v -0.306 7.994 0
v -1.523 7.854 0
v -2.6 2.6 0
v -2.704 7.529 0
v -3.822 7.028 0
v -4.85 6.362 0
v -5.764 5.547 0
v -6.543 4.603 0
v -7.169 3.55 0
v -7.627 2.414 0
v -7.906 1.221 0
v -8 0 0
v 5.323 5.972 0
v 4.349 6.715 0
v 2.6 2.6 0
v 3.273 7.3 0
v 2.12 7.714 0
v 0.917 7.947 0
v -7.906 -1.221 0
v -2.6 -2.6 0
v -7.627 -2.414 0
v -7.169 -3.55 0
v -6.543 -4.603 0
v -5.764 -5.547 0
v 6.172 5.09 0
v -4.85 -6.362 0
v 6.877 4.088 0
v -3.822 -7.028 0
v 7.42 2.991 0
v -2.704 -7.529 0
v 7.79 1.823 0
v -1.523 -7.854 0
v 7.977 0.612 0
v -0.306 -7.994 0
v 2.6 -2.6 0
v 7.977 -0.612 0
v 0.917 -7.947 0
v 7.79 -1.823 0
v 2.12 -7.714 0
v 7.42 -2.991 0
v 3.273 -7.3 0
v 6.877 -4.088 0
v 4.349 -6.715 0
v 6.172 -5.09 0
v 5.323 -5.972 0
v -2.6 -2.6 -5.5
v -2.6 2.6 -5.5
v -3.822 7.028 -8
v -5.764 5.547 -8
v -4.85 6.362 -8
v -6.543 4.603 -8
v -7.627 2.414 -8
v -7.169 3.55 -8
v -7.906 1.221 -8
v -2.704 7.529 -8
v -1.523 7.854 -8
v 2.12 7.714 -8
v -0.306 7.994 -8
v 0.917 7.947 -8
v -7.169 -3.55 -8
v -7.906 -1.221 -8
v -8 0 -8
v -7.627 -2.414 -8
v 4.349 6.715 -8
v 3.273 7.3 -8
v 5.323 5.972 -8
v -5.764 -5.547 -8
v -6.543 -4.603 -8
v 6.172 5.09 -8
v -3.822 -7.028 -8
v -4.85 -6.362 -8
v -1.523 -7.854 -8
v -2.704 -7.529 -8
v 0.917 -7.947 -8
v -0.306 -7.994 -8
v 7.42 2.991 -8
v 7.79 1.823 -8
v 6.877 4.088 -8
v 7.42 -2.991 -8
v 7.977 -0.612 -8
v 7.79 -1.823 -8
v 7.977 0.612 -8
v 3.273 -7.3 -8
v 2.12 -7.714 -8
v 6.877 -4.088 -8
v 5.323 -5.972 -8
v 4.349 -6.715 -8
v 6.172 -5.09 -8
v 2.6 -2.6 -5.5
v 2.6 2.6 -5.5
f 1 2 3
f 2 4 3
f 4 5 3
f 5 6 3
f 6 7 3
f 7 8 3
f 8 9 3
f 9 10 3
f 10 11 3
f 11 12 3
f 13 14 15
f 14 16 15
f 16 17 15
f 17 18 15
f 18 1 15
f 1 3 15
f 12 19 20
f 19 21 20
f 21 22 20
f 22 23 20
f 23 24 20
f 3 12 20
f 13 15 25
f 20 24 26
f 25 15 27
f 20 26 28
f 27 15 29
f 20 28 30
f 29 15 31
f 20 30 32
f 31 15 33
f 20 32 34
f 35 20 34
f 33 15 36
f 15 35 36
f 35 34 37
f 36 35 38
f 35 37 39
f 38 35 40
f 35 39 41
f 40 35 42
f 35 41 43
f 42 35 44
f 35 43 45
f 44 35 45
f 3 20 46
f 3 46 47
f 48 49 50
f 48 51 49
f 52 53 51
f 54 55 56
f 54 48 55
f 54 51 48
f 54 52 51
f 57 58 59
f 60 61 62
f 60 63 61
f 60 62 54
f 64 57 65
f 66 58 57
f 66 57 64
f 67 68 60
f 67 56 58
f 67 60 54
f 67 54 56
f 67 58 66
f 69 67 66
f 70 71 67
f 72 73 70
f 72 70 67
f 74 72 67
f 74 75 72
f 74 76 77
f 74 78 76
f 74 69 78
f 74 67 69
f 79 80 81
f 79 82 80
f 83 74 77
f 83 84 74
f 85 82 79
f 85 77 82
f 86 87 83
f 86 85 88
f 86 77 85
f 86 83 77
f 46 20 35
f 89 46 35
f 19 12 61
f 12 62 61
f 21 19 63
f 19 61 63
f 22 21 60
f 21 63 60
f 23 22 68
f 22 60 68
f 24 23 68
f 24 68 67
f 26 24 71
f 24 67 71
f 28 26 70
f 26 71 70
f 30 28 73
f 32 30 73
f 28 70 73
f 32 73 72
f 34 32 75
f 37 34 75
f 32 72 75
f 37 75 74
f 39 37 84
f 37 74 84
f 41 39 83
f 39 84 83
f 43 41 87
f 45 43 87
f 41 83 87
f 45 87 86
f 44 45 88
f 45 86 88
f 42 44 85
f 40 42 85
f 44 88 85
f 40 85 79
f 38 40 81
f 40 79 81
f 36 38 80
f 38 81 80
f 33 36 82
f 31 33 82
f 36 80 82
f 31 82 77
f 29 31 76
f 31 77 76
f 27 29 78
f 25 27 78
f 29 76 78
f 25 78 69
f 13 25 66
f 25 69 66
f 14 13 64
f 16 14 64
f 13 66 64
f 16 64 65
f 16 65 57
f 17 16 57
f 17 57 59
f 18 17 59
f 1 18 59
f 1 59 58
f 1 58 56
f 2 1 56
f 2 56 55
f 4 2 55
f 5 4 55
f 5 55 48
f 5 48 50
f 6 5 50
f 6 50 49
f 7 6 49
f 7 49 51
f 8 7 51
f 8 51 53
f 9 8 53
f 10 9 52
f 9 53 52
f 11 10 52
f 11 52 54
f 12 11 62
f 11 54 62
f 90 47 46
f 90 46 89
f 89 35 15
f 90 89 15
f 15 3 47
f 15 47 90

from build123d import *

# Parameters (mm, degrees)
ESQUISSE1_W             = 8
ESQUISSE1_H             = 8
ESQUISSE3_W             = 5.2
ESQUISSE3_H             = 5.2
ENL_V_MAT_EXTRU_1_DEPTH = 5.5


with BuildPart() as part:
    # Esquisse1 → Révolution2 (revolve)
    with BuildSketch(Plane(origin=(0, 0, 0), x_dir=(1, 0, 0), z_dir=(0, 1, 0)), mode=Mode.PRIVATE) as r_volution2_sk:
        with Locations((4, 4)):
            Rectangle(ESQUISSE1_W, ESQUISSE1_H)
    revolve(r_volution2_sk.sketch.rotate(Axis((0, 0, -8), (0, 0, 1)), 180), axis=Axis((0, 0, -8), (0, 0, 1)))

    # Esquisse3 → Enlèv. mat.-Extru.1 (cut)
    with BuildSketch(Plane.XY):
        Rectangle(ESQUISSE3_W, ESQUISSE3_H)
    extrude(amount=-ENL_V_MAT_EXTRU_1_DEPTH, mode=Mode.SUBTRACT)


solid = part.part
